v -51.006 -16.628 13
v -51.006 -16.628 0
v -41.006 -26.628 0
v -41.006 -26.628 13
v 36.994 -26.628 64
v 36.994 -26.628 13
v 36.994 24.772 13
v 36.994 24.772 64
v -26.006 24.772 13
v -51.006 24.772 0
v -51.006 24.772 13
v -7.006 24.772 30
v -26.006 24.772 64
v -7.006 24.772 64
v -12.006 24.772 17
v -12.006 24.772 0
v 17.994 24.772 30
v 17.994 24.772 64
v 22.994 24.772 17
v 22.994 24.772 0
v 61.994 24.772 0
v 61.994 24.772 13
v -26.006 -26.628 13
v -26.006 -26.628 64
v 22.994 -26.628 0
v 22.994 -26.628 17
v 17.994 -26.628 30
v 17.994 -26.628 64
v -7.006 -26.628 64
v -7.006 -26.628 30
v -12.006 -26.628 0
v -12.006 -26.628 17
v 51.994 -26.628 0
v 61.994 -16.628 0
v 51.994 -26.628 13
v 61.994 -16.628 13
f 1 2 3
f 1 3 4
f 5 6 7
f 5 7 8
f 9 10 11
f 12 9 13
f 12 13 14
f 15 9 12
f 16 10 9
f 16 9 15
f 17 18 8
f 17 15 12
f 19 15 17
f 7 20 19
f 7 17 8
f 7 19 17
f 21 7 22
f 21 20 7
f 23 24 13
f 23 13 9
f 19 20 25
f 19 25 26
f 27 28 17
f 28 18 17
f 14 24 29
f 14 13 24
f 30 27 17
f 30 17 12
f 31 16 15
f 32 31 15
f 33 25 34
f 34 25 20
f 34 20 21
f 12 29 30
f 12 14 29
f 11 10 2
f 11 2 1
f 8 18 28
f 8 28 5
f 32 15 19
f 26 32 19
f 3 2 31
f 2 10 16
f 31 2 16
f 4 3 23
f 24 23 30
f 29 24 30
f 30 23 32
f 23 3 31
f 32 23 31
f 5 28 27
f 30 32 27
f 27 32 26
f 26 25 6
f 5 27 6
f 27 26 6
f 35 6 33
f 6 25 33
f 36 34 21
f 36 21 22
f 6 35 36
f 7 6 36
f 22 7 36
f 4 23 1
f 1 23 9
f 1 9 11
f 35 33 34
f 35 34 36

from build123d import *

# Parameters (mm, degrees)
F0_W      = 113
F0_H      = 26
F1_DEPTH  = 64
F2_W      = 25
F2_H      = 36.5019804899
F3_DEPTH  = 50.8
F4_W      = 25
F4_H      = 65.5092679775
F5_DEPTH  = 50.8
F6_DEPTH  = 25.4
F7_W      = 25
F7_H      = 54.8469666392
F8_DEPTH  = 50.8
F9_W      = 35
F9_H      = 17
F10_DEPTH = 50.8
F11_SIZE  = 10
F12_SIZE  = 10


# Not quite as in the source:
# - a feature of the source that left no trace in its solid (it failed there, or was rolled back) is left out


with BuildPart() as f1:
    # F0 (on Top) → F1 (new body)
    with BuildSketch(Plane.XY):
        with Locations((5.4938797247, 11.7718060501)):
            Rectangle(F0_W, F0_H)
    extrude(amount=F1_DEPTH)

    # F2 (on Front) → F3 (cut, symmetric)
    with BuildSketch(Plane.XZ):
        with Locations((5.4938797247, 48.2509902449)):
            Rectangle(F2_W, F2_H)
    extrude(amount=F3_DEPTH, both=True, mode=Mode.SUBTRACT)

    # F4 (on Front) → F5 (cut, symmetric)
    with BuildSketch(Plane.XZ):
        with Locations((-38.5061202753, 45.7546339888)):
            Rectangle(F4_W, F4_H)
    extrude(amount=F5_DEPTH, both=True, mode=Mode.SUBTRACT)

    # F6 (add): faces of the model
    f6_faces = [f1.faces().sort_by_distance(p)[0] for p in [
        (16.4788023799, -1.2281939499, 27.8806540043),
        (16.4788023799, 24.7718060501, 27.8806540043),
    ]]
    extrude(f6_faces, amount=F6_DEPTH, dir=(0, -1, 0))

    # F7 (on Front) → F8 (cut, symmetric)
    with BuildSketch(Plane.XZ):
        with Locations((49.4938797247, 40.4234833196)):
            Rectangle(F7_W, F7_H)
    extrude(amount=F8_DEPTH, both=True, mode=Mode.SUBTRACT)

    # F9 (on Front) → F10 (cut, symmetric)
    with BuildSketch(Plane.XZ):
        with Locations((5.4938797247, 8.5)):
            Rectangle(F9_W, F9_H)
    extrude(amount=F10_DEPTH, both=True, mode=Mode.SUBTRACT)

    # F11
    f11_edges = [f1.edges().sort_by_distance(p)[0] for p in [
        (61.99388, -26.628194, 6.5),
    ]]
    chamfer(f11_edges, length=F11_SIZE)

    # F12
    f12_edges = [f1.edges().sort_by_distance(p)[0] for p in [
        (-51.00612, -26.628194, 6.5),
    ]]
    chamfer(f12_edges, length=F12_SIZE)


solid = f1.part
